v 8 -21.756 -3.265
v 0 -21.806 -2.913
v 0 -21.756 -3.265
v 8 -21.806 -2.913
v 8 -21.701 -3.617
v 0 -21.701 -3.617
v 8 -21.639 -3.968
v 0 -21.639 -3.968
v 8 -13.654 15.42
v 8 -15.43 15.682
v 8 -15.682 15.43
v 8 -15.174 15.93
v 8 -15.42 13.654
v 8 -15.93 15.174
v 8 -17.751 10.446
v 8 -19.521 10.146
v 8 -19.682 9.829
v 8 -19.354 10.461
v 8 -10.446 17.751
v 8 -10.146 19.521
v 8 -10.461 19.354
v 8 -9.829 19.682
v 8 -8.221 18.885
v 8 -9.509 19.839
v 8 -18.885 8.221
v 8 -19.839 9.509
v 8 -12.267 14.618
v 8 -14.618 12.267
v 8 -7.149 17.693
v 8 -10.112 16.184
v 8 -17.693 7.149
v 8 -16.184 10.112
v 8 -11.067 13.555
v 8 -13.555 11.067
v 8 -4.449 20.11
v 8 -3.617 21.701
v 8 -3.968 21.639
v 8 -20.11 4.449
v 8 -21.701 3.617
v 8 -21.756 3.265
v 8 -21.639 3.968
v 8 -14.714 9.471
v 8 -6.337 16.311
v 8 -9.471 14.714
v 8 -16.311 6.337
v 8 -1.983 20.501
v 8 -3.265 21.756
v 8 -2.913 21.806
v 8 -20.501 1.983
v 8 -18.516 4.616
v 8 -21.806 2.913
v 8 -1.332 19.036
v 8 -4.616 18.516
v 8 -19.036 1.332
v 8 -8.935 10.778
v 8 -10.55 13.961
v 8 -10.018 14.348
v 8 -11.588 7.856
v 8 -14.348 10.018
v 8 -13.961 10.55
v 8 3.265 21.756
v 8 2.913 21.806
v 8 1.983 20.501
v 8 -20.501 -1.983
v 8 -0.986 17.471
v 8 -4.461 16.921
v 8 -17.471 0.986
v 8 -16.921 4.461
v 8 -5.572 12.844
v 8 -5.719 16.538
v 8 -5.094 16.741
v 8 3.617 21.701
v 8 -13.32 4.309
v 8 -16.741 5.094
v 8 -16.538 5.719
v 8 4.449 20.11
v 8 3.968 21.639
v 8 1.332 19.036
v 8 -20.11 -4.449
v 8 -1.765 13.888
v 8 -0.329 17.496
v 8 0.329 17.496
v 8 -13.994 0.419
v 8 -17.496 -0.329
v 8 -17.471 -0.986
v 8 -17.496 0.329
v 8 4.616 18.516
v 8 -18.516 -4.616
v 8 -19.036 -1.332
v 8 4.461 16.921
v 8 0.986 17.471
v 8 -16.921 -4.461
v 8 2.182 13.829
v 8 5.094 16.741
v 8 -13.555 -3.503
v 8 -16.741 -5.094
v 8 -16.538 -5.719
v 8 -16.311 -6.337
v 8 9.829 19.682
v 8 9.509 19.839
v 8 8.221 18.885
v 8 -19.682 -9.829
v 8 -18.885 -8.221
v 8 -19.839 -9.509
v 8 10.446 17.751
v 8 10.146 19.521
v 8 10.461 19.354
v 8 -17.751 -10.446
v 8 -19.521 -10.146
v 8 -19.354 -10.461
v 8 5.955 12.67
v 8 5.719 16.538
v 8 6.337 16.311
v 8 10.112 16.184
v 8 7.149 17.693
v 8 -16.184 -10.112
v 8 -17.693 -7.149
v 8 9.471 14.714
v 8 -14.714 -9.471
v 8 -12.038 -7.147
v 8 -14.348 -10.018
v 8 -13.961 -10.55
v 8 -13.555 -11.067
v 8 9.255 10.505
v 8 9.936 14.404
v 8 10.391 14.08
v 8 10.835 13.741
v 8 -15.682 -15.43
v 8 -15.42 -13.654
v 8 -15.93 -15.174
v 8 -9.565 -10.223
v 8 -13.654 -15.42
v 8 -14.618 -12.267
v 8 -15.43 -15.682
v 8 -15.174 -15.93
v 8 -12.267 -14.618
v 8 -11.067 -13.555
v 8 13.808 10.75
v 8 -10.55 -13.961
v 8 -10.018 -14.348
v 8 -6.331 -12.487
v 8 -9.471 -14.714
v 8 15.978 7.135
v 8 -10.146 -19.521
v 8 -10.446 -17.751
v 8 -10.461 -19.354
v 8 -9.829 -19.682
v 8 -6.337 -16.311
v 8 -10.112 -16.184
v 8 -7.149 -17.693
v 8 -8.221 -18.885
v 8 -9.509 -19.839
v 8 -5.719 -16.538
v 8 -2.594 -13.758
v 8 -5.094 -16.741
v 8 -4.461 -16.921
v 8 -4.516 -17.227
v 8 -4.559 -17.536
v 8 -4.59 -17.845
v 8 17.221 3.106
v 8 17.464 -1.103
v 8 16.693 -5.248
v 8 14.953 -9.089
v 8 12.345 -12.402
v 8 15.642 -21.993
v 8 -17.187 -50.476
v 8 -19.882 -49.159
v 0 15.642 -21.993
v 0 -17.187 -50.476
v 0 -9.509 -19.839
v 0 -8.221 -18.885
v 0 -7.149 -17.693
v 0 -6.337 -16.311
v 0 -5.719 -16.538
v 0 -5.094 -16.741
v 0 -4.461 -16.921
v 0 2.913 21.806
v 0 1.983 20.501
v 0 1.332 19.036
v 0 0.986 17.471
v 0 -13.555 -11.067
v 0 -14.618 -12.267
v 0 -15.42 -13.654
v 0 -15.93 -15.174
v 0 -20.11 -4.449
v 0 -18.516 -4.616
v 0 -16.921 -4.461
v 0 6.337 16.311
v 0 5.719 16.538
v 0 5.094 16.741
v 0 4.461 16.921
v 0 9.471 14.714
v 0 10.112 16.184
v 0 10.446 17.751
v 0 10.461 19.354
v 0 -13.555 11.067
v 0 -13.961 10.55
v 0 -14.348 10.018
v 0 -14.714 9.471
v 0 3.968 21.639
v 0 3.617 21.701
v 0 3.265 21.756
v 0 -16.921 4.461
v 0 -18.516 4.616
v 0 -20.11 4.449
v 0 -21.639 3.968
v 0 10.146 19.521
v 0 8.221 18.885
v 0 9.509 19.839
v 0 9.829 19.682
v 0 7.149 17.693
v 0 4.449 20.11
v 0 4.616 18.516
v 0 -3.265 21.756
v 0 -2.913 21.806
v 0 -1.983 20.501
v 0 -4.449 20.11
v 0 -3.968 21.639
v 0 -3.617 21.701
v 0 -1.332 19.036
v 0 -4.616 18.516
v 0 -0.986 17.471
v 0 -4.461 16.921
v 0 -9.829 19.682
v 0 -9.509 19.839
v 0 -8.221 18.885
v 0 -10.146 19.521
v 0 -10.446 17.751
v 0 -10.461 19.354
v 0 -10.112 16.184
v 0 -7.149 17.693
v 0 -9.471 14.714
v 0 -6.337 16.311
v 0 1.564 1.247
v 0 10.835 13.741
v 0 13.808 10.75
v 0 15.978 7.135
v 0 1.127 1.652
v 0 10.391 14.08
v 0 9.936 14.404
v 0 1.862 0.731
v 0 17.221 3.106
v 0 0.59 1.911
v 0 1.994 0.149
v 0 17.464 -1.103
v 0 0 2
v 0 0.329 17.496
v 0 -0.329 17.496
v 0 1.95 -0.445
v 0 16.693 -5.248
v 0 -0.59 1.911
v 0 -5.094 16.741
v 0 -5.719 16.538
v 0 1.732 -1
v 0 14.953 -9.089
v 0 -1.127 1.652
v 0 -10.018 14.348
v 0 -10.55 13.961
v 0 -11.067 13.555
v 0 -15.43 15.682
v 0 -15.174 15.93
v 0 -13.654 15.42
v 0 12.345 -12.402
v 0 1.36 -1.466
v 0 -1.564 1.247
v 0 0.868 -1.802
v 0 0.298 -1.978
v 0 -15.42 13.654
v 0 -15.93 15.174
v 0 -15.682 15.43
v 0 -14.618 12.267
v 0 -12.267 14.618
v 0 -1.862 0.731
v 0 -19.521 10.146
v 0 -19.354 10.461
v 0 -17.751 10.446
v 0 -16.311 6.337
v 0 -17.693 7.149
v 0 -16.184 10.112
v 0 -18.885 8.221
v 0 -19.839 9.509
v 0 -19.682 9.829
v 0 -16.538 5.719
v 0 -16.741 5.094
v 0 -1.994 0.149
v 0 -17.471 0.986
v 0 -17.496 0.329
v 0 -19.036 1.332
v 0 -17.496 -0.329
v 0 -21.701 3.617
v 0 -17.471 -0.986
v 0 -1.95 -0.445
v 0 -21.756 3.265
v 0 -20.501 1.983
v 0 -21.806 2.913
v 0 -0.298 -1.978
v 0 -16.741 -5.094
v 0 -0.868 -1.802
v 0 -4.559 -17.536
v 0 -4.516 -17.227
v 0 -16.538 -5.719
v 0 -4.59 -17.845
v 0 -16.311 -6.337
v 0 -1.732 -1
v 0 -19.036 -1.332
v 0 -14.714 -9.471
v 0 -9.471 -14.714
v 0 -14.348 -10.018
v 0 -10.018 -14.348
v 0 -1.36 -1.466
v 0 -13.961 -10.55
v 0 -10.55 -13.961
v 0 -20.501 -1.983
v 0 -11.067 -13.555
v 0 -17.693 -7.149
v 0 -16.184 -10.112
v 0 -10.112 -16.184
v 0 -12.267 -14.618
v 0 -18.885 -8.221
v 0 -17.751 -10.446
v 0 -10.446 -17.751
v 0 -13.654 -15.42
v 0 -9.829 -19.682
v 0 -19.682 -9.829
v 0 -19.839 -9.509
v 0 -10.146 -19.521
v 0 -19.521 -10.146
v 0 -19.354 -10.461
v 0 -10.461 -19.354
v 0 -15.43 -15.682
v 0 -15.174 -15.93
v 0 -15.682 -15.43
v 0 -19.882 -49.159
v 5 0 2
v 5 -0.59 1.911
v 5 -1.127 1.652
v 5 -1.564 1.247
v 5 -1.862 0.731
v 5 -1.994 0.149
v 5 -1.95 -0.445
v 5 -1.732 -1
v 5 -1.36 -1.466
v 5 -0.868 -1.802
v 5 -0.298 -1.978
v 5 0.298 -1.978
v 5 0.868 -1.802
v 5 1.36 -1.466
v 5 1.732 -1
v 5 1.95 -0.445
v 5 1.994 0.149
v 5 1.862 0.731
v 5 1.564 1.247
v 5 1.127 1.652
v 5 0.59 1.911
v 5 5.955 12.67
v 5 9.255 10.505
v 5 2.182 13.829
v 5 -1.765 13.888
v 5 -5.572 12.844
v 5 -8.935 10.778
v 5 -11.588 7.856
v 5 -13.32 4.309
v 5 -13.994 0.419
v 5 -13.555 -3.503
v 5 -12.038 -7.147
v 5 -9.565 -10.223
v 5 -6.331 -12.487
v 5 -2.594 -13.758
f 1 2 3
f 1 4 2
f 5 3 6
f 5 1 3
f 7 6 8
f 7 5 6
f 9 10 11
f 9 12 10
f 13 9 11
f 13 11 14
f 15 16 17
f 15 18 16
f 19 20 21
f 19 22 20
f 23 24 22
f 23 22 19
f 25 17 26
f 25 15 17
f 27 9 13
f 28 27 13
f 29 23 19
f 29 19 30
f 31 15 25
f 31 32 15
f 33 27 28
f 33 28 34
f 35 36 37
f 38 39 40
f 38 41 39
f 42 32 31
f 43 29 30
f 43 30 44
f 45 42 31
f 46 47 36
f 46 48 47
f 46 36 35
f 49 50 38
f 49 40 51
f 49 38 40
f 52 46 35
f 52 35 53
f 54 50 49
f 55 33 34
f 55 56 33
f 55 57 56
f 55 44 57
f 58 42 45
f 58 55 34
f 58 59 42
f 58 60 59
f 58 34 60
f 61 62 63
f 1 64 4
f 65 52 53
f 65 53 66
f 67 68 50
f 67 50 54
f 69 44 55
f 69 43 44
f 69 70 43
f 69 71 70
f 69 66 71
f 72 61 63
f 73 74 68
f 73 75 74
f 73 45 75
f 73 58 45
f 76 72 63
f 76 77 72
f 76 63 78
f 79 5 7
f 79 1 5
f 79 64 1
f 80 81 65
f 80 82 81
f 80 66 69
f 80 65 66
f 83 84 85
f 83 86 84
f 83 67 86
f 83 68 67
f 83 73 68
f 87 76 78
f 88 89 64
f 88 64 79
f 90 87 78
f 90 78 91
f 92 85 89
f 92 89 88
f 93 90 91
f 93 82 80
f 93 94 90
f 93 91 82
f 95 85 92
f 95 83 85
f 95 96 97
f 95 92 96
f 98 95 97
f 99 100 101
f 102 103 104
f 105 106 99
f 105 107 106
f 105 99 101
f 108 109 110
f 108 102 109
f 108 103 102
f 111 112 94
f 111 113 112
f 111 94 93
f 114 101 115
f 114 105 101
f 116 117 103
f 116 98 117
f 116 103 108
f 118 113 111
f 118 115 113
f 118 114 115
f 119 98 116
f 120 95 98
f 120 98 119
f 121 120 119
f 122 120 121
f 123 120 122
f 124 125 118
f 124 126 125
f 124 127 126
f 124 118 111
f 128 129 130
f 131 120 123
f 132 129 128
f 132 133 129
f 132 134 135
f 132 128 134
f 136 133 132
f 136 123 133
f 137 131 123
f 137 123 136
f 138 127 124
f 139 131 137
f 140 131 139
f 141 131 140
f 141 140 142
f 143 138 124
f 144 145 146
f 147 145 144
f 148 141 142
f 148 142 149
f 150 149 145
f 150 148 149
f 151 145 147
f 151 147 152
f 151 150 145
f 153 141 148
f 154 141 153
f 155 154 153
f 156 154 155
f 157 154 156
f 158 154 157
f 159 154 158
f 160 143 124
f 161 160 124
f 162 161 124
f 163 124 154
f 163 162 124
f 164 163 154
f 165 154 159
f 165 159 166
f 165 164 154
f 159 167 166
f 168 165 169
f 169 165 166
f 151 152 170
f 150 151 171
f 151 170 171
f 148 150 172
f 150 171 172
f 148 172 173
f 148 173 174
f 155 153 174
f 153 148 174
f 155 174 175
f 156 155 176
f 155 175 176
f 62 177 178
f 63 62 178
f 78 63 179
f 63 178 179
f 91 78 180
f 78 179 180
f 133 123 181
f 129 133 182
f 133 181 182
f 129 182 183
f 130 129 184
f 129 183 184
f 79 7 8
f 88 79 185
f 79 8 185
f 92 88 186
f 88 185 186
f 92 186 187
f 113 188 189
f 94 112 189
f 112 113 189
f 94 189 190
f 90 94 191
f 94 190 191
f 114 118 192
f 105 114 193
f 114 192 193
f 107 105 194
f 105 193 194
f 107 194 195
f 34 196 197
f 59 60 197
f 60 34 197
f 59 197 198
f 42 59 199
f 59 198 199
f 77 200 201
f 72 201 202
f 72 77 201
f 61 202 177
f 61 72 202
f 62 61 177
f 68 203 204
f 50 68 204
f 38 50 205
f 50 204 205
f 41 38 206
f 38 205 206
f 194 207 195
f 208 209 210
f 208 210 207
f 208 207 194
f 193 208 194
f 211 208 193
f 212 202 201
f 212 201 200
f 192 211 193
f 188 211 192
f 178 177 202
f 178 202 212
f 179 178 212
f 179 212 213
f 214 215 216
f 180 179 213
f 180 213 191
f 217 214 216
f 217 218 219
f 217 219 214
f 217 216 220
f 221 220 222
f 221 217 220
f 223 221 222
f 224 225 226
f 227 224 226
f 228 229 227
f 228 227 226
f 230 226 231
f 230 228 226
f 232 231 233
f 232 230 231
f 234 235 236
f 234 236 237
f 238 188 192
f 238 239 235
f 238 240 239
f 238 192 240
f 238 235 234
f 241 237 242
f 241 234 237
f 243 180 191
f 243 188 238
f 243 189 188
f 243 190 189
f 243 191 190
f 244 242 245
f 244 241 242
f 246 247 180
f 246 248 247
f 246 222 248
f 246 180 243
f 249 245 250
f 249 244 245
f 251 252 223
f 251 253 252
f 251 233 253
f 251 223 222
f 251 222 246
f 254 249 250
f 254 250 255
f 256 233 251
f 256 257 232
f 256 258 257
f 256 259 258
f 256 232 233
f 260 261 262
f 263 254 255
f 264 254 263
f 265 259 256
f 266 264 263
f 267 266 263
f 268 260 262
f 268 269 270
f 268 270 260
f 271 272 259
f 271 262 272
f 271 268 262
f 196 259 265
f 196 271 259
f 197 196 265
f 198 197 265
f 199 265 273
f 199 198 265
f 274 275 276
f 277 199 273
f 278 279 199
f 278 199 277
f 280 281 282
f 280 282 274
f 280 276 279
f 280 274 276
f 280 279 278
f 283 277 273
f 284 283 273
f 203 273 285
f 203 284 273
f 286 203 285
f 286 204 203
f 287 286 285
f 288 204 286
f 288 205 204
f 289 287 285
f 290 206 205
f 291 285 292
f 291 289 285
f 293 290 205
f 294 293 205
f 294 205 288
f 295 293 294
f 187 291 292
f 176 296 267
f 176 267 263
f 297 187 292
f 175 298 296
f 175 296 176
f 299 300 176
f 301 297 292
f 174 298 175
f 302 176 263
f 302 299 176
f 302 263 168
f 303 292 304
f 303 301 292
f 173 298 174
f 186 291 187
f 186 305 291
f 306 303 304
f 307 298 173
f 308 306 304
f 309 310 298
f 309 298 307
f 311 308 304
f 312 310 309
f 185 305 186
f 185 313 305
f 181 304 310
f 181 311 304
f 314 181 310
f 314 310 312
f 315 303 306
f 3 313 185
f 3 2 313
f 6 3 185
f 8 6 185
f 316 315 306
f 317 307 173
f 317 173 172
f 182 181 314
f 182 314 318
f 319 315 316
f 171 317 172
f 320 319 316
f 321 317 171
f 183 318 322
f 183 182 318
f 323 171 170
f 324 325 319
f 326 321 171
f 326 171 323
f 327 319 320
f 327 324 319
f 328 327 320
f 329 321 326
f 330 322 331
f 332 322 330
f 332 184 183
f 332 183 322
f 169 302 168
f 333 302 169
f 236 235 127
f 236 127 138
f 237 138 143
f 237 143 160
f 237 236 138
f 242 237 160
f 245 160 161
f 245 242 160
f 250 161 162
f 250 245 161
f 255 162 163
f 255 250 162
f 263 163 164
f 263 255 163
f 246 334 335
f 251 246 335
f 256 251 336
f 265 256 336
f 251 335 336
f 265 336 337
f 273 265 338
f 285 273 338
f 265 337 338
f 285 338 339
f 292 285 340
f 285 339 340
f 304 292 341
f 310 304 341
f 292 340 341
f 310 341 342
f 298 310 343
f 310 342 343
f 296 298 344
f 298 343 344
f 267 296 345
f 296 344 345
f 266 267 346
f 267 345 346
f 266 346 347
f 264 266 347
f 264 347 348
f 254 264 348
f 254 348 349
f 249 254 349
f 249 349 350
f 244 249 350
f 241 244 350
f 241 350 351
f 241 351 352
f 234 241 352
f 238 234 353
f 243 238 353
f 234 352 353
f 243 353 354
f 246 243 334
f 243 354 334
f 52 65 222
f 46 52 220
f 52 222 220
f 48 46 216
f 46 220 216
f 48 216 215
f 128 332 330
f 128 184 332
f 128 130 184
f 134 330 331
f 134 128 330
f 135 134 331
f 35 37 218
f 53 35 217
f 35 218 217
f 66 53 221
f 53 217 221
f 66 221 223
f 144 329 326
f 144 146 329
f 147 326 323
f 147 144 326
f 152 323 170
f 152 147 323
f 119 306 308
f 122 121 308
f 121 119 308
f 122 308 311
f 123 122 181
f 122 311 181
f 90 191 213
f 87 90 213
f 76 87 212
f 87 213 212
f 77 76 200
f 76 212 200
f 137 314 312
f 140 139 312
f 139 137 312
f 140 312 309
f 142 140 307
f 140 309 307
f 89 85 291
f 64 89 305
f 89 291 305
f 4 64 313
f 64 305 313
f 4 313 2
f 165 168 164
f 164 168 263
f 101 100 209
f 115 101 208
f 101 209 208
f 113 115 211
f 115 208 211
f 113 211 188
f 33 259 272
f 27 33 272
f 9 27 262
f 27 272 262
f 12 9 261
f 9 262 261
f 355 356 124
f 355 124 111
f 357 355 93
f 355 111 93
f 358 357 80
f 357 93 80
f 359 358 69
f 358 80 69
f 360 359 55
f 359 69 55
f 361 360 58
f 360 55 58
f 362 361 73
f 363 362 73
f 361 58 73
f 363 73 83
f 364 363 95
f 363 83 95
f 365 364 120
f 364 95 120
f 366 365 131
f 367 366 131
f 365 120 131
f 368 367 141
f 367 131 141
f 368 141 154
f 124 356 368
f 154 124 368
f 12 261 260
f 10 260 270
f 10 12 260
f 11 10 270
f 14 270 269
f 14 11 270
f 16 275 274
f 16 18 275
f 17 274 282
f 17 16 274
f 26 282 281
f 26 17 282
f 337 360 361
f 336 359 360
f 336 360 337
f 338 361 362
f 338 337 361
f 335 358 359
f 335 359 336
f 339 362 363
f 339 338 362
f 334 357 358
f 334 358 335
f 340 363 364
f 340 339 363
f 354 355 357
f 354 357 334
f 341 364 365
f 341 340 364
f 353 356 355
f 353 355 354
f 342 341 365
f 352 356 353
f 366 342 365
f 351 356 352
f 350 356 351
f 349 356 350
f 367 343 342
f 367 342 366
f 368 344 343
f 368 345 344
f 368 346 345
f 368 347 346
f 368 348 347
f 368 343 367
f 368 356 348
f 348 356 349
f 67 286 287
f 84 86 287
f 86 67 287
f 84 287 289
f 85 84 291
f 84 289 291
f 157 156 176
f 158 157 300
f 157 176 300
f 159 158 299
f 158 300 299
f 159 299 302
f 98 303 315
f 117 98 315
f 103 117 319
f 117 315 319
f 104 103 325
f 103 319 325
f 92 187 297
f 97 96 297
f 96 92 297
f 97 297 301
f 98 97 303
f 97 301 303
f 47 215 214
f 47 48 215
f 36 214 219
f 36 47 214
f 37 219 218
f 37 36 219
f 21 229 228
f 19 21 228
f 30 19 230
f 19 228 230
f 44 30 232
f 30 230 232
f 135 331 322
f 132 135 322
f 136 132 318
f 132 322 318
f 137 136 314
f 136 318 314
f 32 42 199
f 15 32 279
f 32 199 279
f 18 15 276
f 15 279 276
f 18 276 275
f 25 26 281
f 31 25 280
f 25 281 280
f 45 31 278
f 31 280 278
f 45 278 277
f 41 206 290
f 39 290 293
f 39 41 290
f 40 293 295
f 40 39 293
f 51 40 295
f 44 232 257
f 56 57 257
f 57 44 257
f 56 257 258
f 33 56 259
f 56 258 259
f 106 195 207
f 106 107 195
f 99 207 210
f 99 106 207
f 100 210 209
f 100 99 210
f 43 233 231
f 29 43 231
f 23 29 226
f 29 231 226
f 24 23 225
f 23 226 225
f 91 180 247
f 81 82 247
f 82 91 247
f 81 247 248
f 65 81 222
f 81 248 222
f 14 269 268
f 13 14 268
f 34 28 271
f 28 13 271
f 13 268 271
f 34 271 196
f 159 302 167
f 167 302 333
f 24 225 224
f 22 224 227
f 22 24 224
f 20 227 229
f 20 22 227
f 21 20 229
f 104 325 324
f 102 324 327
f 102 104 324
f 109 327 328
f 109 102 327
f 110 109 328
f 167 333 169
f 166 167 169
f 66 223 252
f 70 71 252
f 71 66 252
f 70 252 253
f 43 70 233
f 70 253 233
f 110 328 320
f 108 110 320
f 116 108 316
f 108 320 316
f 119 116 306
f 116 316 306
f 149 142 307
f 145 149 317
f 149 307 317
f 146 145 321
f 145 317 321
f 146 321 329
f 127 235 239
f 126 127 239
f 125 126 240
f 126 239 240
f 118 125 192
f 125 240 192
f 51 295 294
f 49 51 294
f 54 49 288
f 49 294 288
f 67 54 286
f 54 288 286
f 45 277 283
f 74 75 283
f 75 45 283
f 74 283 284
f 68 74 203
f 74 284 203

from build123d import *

# Parameters (mm, degrees)
BASPROSKE_W         = 8
BASPROSKE_H         = 22
TOOTHCUT_DEPTH      = 33.124756808
TEETHCUTS_COUNT     = 20
TEETHCUTS_ANGLE     = 342
BORSKE_R            = 2
BORE_DEPTH          = 8
SKETCH1_R           = 14
CUT_EXTRUDE1_DEPTH  = 3
CUT_EXTRUDE2_DEPTH  = 32.859573128
BOSS_EXTRUDE1_DEPTH = 8
CUT_EXTRUDE3_DEPTH  = 66.194920127
CHAMFER1_SIZE       = 30


with BuildPart() as part:
    # BasProSke → Base-Revolve (revolve)
    with BuildSketch(Plane(origin=(0, 0, 0), x_dir=(1, 0, 0), z_dir=(0, 1, 0)), mode=Mode.PRIVATE) as base_revolve_sk:
        with Locations((4, 11)):
            Rectangle(BASPROSKE_W, BASPROSKE_H)
    revolve(base_revolve_sk.sketch.rotate(Axis((-10, 0, 0), (1, 0, 0)), 180), axis=Axis((-10, 0, 0), (1, 0, 0)))

    # TooCutSke → ToothCut (cut, through all)
    with BuildSketch(Plane(origin=(0, 0, 0), x_dir=(0, 0, -1), z_dir=(1, 0, 0))):
        with BuildLine():
            ThreePointArc((0.986171591, 17.471189616), (0, 17.499), (-0.986171591, 17.471189616))
            ThreePointArc((-0.986171591, 17.471189616), (-1.626916196, 19.798789858), (-2.932850173, 21.829260982))
            ThreePointArc((-2.932850173, 21.829260982), (0, 22.0254), (2.932850173, 21.829260982))
            ThreePointArc((2.932850173, 21.829260982), (1.626916196, 19.798789858), (0.986171591, 17.471189616))
        make_face()
    toothcut = extrude(amount=TOOTHCUT_DEPTH, mode=Mode.SUBTRACT)

    # TeethCuts: ToothCut ×20 about axis
    teethcuts_axis = Axis((-10, 0, 0), (1, 0, 0))
    for i in range(1, TEETHCUTS_COUNT):
        add(toothcut.rotate(teethcuts_axis, i * TEETHCUTS_ANGLE / (TEETHCUTS_COUNT - 1)), mode=Mode.SUBTRACT)

    # BorSke → Bore (cut, symmetric)
    with BuildSketch(Plane(origin=(0, 0, 0), x_dir=(0, 0, -1), z_dir=(1, 0, 0))):
        with Locations(Location((0, 0, 0), (0, 0, 180))):
            Circle(BORSKE_R)
    extrude(amount=BORE_DEPTH, both=True, mode=Mode.SUBTRACT)

    # Sketch1 → Cut-Extrude1 (cut)
    with BuildSketch(Plane(origin=(8, 0, 0), x_dir=(0, 0, -1), z_dir=(1, 0, 0))):
        Circle(SKETCH1_R)
    extrude(amount=-CUT_EXTRUDE1_DEPTH, mode=Mode.SUBTRACT)

    # Sketch2 → Cut-Extrude2 (cut, through all)
    with BuildSketch(Plane.ZY):
        Polygon((-21.592193025, -6.419793995), (20.580067201, 14.175220465), (12.820897061, 30.063616315), (-23.756341743, 14.175220465), (-26.106914947, 1.214231969), align=None)
    extrude(amount=-CUT_EXTRUDE2_DEPTH, mode=Mode.SUBTRACT)

    # Sketch3 → Boss-Extrude1 (add)
    with BuildSketch(Plane.ZY):
        Polygon((13.740882365, 10.835273546), (-49.159279282, -19.882305538), (-57.935730449, -1.910830782), (4.964431198, 28.806748303), align=None)
    extrude(amount=-BOSS_EXTRUDE1_DEPTH)

    # Sketch6 → Cut-Extrude3 (cut, through all)
    with BuildSketch(Plane(origin=(8, 0, 0), x_dir=(0, 0, -1), z_dir=(1, 0, 0))):
        Polygon((50.475746957, -17.186584325), (57.935730449, -1.910830782), (21.992780936, 15.642071552), align=None)
    extrude(amount=-CUT_EXTRUDE3_DEPTH, mode=Mode.SUBTRACT)

    # Chamfer1
    # the kernel refuses this chamfer: 30 mm, written as the material it takes off along each edge
    with BuildSketch(Plane(origin=(-77.150489639, 28.806748303, 4.964431198), x_dir=(0, -0.4139495743409253, -0.9102998131950631), z_dir=(1, 0, 0))) as chamfer1_piece_1_section:
        Polygon((CHAMFER1_SIZE * 0.999621916911, -CHAMFER1_SIZE * 0.0274958766106), (-CHAMFER1_SIZE * 0.0274958766106, -CHAMFER1_SIZE * 0.999621916911), (0, 0), align=None)
    chamfer1_piece_1 = extrude(amount=162.300979278, mode=Mode.PRIVATE)
    chamfer1_piece_1 = chamfer1_piece_1 - Plane(origin=(2.5, 0, 0), x_dir=(0, 0.632443978109164, 0.7746061028377297), z_dir=(-1, 0, 0)) * Cylinder(17.499, 445, mode=Mode.PRIVATE)
    chamfer1_piece_1 = split(chamfer1_piece_1, bisect_by=Plane(origin=(2.5, 5.973711679, 3.785897747), z_dir=(0, 0.898573737810962, -0.43882255834954154)), keep=Keep.TOP, mode=Mode.PRIVATE)
    add(chamfer1_piece_1, mode=Mode.SUBTRACT)


solid = part.part
